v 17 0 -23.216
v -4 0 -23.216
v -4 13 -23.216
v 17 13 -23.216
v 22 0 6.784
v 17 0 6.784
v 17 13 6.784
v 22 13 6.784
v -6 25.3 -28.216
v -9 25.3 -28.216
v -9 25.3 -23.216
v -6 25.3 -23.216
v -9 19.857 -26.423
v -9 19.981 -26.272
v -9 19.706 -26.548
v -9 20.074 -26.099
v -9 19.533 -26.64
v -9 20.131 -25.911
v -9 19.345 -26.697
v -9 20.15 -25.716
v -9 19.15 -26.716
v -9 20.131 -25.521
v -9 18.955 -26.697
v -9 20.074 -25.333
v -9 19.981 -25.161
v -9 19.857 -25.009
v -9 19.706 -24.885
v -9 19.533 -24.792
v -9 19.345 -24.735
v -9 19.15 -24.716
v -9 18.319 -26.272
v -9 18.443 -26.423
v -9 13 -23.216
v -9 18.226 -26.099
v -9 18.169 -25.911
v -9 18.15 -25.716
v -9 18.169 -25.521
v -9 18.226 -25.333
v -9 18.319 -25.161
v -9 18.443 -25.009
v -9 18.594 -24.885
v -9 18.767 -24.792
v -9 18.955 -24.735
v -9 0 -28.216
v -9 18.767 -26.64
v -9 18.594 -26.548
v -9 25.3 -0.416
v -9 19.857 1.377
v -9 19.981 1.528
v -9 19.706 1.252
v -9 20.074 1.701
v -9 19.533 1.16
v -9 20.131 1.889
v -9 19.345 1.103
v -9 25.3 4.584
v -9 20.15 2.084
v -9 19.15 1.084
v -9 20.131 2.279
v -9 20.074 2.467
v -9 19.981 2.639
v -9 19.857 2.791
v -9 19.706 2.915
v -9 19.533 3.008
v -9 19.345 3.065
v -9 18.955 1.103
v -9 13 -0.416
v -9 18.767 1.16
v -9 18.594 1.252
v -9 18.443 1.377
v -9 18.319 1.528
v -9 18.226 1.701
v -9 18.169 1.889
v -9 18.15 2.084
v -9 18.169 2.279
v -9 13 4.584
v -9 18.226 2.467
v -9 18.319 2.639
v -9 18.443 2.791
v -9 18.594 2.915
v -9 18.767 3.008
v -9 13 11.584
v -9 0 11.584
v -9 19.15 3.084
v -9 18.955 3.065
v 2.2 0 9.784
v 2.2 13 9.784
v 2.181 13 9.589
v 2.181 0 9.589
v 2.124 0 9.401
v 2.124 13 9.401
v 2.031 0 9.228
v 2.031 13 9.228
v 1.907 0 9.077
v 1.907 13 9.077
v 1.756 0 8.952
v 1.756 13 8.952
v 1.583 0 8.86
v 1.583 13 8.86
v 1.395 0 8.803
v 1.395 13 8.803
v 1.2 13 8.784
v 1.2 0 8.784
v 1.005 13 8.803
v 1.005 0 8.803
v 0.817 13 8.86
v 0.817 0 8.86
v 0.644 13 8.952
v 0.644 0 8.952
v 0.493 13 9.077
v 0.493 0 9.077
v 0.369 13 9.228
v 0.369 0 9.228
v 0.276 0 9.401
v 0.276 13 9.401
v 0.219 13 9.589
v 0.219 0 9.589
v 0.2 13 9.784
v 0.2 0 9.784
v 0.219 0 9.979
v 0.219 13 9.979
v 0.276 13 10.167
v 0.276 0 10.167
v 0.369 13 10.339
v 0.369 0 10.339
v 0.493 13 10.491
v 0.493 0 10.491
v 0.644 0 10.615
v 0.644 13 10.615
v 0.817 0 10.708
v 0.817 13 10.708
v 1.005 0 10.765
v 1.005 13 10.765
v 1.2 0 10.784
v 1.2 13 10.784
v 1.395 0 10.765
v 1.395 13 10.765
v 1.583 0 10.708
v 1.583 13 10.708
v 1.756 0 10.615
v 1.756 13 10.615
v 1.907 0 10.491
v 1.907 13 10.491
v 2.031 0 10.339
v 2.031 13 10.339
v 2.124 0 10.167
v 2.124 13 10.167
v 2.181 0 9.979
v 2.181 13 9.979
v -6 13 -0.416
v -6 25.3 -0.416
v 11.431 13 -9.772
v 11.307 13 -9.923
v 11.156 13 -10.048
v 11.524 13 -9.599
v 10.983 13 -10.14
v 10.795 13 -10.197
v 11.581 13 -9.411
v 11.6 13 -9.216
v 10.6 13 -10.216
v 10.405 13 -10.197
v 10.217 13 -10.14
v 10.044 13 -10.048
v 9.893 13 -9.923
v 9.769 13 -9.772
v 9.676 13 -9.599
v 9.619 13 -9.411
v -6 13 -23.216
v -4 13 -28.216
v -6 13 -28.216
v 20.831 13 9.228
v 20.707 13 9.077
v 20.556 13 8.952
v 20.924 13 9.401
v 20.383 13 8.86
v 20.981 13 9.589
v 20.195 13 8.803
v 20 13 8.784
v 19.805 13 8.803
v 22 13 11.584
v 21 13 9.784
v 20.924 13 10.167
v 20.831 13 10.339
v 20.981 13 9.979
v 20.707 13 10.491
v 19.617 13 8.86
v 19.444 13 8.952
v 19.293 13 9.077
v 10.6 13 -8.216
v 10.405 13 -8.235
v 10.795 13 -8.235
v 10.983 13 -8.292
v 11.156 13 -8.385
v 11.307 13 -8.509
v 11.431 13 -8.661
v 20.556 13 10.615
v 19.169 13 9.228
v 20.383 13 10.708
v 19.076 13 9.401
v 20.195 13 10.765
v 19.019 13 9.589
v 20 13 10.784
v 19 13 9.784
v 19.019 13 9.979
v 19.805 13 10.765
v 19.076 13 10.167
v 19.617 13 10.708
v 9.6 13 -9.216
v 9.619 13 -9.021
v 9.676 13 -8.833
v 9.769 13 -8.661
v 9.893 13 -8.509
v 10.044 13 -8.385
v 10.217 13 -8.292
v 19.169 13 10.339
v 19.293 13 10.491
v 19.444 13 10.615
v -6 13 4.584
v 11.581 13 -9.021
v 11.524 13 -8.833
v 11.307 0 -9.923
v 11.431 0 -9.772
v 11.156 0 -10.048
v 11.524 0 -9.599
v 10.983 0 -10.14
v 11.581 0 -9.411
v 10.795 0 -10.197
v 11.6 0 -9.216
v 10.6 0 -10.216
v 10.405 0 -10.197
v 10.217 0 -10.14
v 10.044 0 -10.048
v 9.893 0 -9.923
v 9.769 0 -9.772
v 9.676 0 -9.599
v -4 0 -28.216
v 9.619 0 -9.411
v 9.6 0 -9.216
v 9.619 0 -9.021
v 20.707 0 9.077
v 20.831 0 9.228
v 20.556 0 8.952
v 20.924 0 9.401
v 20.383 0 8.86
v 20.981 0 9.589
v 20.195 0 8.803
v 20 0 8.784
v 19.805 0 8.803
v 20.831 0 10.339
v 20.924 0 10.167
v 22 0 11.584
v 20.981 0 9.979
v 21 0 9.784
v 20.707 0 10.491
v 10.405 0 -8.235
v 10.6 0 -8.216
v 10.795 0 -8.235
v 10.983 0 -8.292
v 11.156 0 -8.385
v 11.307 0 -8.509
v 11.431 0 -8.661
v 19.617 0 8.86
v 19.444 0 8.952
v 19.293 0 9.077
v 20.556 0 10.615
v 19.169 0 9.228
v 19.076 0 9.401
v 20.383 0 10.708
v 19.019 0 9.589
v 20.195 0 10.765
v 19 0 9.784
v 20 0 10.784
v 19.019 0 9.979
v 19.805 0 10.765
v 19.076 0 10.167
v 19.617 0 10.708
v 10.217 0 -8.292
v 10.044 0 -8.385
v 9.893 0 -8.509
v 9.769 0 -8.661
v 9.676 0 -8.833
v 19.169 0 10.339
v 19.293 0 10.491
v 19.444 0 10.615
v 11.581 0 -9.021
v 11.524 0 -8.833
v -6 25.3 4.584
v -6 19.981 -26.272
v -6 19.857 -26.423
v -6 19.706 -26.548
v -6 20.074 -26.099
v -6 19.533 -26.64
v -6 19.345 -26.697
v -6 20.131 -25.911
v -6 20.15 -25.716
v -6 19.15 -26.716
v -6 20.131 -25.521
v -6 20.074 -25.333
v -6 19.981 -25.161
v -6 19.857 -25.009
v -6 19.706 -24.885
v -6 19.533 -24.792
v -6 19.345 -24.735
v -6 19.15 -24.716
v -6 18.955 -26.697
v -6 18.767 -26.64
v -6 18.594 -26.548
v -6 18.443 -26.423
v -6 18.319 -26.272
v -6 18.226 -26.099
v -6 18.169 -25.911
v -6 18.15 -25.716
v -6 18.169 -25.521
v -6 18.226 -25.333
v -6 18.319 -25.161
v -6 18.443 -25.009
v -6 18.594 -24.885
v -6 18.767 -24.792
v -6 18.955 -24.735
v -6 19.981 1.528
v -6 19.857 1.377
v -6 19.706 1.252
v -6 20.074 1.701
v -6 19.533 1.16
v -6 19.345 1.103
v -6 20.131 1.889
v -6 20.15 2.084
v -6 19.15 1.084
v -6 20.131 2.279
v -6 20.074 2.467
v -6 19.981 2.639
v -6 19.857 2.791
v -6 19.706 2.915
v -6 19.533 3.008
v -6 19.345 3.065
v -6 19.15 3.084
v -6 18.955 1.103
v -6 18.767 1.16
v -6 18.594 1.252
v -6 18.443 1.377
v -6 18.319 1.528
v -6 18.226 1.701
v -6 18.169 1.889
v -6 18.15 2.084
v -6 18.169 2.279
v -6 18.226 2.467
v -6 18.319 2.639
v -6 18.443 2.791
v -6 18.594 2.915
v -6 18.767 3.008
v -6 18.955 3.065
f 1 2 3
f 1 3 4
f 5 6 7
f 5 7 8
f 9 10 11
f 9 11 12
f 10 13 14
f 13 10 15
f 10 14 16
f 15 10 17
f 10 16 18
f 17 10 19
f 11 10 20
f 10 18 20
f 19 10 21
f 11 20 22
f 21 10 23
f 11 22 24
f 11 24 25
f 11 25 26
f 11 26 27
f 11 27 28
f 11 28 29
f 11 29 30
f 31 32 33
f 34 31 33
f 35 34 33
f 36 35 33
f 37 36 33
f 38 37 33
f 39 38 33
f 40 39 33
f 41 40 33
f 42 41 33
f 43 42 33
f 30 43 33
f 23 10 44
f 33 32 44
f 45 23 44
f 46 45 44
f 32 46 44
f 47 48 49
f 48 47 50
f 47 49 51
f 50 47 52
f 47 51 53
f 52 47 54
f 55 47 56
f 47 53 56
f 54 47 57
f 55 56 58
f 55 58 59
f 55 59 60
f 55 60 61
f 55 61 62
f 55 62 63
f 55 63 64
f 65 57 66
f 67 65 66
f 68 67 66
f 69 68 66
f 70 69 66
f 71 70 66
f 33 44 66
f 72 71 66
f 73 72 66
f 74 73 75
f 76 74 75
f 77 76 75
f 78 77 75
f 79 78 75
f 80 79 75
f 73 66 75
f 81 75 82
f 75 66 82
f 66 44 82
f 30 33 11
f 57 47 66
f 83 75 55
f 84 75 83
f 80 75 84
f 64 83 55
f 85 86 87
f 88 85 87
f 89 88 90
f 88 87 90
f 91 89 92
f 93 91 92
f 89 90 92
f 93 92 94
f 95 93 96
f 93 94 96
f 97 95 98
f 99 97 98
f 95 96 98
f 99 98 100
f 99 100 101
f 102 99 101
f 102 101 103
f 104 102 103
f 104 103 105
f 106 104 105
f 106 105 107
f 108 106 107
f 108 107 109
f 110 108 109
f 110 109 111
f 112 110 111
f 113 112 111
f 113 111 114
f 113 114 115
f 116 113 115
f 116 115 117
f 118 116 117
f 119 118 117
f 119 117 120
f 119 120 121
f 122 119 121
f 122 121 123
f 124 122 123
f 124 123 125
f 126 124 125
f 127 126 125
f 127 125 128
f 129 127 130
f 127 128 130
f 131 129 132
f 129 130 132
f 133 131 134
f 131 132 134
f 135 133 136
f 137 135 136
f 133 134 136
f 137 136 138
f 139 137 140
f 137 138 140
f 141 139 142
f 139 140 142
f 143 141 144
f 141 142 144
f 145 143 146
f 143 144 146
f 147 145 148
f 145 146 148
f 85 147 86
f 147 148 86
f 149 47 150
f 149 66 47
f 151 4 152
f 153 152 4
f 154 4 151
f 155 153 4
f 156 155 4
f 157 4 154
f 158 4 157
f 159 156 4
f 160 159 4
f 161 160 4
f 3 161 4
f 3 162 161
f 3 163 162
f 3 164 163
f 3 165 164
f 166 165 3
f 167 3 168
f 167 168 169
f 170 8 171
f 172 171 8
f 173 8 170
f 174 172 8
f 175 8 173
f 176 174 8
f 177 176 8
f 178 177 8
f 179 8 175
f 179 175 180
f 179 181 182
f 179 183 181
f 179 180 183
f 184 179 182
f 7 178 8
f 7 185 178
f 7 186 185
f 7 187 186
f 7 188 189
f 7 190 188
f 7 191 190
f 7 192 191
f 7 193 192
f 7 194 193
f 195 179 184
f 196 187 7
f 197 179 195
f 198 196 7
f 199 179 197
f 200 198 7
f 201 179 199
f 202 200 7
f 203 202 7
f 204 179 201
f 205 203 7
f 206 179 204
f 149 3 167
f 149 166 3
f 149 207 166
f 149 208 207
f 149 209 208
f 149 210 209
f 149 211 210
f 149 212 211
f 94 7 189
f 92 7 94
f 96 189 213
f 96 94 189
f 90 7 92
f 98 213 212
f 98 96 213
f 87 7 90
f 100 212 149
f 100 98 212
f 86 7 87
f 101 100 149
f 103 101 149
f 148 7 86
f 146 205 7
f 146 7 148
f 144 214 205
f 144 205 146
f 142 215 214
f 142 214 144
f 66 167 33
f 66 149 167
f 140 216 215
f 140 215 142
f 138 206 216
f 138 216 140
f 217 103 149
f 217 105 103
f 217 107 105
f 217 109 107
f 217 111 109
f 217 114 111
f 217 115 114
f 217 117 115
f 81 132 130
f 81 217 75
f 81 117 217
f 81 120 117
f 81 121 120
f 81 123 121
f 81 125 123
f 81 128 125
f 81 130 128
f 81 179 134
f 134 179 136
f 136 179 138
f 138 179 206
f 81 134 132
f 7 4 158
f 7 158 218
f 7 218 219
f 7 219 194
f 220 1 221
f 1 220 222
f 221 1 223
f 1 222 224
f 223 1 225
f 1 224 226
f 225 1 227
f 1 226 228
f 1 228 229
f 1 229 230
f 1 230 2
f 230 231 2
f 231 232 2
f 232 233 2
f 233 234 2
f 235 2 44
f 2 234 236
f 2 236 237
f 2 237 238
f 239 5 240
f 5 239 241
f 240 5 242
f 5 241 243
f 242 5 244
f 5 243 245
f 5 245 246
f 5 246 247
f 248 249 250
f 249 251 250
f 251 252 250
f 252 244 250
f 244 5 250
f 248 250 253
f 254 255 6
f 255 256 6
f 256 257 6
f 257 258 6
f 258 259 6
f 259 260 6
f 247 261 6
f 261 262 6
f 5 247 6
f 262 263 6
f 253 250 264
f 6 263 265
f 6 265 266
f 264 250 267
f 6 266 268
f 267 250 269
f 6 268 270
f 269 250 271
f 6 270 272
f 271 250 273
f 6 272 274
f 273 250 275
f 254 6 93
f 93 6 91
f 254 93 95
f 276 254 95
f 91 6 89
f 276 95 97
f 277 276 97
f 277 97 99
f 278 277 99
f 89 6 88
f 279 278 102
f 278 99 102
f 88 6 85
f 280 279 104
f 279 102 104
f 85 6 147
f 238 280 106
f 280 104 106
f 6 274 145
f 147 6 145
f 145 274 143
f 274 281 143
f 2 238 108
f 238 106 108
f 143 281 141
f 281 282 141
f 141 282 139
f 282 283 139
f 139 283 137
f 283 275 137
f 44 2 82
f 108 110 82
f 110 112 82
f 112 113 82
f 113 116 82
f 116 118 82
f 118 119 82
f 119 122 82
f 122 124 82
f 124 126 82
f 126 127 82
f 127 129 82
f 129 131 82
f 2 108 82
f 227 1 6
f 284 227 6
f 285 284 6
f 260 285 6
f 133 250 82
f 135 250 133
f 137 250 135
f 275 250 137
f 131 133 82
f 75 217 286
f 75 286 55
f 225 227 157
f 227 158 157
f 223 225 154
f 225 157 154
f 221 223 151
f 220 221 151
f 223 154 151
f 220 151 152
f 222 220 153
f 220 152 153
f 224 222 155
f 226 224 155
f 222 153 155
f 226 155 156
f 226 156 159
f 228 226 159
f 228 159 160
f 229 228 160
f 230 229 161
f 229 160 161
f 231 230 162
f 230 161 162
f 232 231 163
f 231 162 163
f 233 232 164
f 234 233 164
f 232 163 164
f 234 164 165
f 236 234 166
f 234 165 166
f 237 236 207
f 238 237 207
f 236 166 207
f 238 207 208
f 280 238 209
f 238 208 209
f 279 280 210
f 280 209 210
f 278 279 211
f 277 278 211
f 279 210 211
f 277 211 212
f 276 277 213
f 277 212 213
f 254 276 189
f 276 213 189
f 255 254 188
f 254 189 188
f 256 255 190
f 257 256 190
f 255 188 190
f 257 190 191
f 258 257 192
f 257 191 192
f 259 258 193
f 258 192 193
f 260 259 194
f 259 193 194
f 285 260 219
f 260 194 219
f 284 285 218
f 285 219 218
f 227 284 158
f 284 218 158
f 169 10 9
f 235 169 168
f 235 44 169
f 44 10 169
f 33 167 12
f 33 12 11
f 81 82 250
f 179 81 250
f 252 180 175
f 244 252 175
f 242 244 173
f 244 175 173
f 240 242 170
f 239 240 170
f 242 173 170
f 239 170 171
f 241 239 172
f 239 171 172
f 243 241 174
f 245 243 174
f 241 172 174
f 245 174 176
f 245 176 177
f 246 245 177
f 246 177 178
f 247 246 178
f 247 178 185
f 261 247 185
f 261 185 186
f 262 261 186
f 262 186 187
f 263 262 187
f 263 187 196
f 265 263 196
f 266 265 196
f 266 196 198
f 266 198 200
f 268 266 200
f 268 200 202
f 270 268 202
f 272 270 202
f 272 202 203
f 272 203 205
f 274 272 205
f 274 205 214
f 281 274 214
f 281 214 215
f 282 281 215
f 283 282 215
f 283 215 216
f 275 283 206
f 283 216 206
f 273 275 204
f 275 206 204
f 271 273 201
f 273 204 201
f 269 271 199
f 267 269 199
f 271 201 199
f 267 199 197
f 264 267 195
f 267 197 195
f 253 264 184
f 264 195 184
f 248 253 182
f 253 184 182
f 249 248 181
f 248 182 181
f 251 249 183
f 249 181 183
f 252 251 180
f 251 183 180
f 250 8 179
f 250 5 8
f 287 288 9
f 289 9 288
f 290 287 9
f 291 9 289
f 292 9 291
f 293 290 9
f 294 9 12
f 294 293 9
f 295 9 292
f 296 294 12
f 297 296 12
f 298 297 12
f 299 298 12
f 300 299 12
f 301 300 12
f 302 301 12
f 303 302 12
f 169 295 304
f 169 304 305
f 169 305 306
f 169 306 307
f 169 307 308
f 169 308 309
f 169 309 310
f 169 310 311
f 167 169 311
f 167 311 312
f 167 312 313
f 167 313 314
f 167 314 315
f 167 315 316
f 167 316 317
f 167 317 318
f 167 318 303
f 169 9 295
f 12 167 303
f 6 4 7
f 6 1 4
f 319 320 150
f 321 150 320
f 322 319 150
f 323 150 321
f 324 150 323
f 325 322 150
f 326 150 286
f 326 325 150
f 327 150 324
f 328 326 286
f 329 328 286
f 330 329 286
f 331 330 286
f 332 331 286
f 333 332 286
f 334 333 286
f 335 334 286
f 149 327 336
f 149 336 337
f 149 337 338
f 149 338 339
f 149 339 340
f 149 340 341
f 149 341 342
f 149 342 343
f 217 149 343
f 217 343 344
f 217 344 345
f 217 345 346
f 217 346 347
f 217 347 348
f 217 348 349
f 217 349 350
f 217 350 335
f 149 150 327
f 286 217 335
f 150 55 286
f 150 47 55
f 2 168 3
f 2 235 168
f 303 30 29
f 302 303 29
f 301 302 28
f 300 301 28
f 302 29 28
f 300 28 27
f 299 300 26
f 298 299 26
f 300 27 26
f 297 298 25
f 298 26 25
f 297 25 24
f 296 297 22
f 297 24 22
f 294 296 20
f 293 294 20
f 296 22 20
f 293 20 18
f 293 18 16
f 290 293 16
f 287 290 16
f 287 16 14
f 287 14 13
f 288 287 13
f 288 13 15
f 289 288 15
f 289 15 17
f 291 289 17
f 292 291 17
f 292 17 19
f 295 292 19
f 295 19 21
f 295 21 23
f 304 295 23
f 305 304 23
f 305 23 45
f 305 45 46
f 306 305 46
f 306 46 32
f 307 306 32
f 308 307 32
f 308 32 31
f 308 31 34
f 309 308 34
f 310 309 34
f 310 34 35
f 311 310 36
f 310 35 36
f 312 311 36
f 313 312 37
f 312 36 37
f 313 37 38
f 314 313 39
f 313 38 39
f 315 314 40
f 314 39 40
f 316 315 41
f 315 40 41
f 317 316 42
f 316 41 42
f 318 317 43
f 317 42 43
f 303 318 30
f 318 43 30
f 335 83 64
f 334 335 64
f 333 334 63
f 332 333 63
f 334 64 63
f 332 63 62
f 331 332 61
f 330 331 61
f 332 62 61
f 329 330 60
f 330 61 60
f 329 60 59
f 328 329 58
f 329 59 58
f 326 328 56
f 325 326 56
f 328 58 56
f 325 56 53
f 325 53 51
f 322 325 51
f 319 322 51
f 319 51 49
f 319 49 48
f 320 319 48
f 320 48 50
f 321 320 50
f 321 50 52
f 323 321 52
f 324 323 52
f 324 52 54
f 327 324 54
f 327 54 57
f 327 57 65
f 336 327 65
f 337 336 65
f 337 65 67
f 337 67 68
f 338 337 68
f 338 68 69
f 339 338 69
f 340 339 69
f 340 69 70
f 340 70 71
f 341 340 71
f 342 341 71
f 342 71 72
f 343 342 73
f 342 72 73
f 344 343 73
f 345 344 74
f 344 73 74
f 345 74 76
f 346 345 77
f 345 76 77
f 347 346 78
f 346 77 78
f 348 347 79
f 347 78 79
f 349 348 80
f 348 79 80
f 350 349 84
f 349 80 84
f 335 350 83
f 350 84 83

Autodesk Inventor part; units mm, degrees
ref_plane "YZ Plane" through (0, 0, 0) normal (1, 0, 0) x (0, 1, 0)
ref_plane "XZ Plane" through (0, 0, 0) normal (0, 1, 0) x (-1, 0, 0)
ref_plane "XY Plane" through (0, 0, 0) normal (0, 0, 1) x (1, 0, 0)
sketch "Sketch1" plane through (0, 0, 0) normal (0, 1, 0) x (-1, 0, 0)
  line L0 (9, -28.2161) -> (9, 11.5839)
  line L1 (9, 11.5839) -> (4, 11.5839)
  line L2 (4, 11.5839) -> (4, 11.5839)
  line L3 (4, 11.5839) -> (-22, 11.5839)
  line L4 (9, -28.2161) -> (4, -28.2161)
  line L5 (4, -28.2161) -> (4, -23.2161)
  line L6 (-22, 6.7839) -> (-22, 11.5839)
  line L7 (4, -23.2161) -> (-17, -23.2161)
  line L8 (-17, -23.2161) -> (-17, 6.7839)
  line L9 (-17, 6.7839) -> (-22, 6.7839)
  point P0 (0, 0)
  dimension "d28" = 0
  dimension "d30" = 5
  dimension "d69" = 5
  dimension "d98" = 5
  dimension "d101" = 21
  dimension "d102" = 30
extrude "Extrusion1" add sketch "Sketch1" along normal blind 13
sketch "Sketch7" plane through (0, 13, 0) normal (0, 1, 0) x (1, 0, 0)
  circle A0 centre (1.2, -9.7839) radius 1
  circle A1 centre (20, -9.7839) radius 1
  circle A2 centre (10.6, 9.2161) radius 1
  line L0 (22, 11.2161) -> (-4, 11.2161) projected
  line L1 (-9, 28.2161) -> (-9, -11.5839) projected
  line L2 (22, -11.5839) -> (22, 11.2161) projected
  point P0 (0, 0)
  point P1 (-4, 23.2161)
  point P2 (-9, 23.2161)
  point P3 (-9, -6.5839)
  dimension "d84" = 2
  dimension "d85" = 2
  dimension "d87" = 2
  dimension "d88" = 19
  dimension "d89" = 9.4
  dimension "d90" = 2
  dimension "d91" = 19
  dimension "d93" = 9.4
  dimension "d100" = 2
extrude "Extrusion8" cut sketch "Sketch7" against normal blind 15
sketch "Sketch8" plane through (0, 13, 0) normal (0, 1, 0) x (1, 0, 0)
  line L0 (-4, 28.2161) -> (-9, 28.2161) projected
  line L1 (-9, 28.2161) -> (-6, 28.2161)
  line L2 (-6, 28.2161) -> (-6, 23.2161)
  line L3 (-6, 23.2161) -> (-9, 23.2161)
  line L4 (-9, 23.2161) -> (-9, 28.2161)
  line L5 (-9, 28.2161) -> (-9, -11.5839) projected
  line L6 (-6, -4.5839) -> (-9, -4.5839)
  line L7 (-9, -4.5839) -> (-9, 0.4161)
  line L8 (-9, 0.4161) -> (-6, 0.4161)
  line L9 (-6, 0.4161) -> (-6, -4.5839)
  point P0 (0, 0)
  dimension "d103" = 3
  dimension "d104" = 5
  dimension "d105" = 5
  dimension "d106" = 3
  dimension "d107" = 22.8
extrude "Extrusion9" add sketch "Sketch8" along normal blind 12.3
sketch "Sketch9" plane through (-9, 0, -28.2161) normal (-1, 0, 0) x (0, 0, 1)
  circle A0 centre (30.3, 19.15) radius 1
  line L0 (32.8, 13) -> (32.8, 25.3) projected
  line L1 (32.8, 13) -> (39.8, 13) projected
  circle A1 centre (2.5, 19.15) radius 1
  line L2 (5, 13) -> (27.8, 13) projected
  line L3 (5, 13) -> (5, 25.3) projected
  point P0 (28.2161, 0)
  dimension "d110" = 2
  dimension "d111" = 2.5
  dimension "d112" = 6.15
  dimension "d113" = 2
  dimension "d114" = 6.15
  dimension "d115" = 2.5
extrude "Extrusion10" cut sketch "Sketch9" against normal blind 12.3
properties part number "spojene 2"
